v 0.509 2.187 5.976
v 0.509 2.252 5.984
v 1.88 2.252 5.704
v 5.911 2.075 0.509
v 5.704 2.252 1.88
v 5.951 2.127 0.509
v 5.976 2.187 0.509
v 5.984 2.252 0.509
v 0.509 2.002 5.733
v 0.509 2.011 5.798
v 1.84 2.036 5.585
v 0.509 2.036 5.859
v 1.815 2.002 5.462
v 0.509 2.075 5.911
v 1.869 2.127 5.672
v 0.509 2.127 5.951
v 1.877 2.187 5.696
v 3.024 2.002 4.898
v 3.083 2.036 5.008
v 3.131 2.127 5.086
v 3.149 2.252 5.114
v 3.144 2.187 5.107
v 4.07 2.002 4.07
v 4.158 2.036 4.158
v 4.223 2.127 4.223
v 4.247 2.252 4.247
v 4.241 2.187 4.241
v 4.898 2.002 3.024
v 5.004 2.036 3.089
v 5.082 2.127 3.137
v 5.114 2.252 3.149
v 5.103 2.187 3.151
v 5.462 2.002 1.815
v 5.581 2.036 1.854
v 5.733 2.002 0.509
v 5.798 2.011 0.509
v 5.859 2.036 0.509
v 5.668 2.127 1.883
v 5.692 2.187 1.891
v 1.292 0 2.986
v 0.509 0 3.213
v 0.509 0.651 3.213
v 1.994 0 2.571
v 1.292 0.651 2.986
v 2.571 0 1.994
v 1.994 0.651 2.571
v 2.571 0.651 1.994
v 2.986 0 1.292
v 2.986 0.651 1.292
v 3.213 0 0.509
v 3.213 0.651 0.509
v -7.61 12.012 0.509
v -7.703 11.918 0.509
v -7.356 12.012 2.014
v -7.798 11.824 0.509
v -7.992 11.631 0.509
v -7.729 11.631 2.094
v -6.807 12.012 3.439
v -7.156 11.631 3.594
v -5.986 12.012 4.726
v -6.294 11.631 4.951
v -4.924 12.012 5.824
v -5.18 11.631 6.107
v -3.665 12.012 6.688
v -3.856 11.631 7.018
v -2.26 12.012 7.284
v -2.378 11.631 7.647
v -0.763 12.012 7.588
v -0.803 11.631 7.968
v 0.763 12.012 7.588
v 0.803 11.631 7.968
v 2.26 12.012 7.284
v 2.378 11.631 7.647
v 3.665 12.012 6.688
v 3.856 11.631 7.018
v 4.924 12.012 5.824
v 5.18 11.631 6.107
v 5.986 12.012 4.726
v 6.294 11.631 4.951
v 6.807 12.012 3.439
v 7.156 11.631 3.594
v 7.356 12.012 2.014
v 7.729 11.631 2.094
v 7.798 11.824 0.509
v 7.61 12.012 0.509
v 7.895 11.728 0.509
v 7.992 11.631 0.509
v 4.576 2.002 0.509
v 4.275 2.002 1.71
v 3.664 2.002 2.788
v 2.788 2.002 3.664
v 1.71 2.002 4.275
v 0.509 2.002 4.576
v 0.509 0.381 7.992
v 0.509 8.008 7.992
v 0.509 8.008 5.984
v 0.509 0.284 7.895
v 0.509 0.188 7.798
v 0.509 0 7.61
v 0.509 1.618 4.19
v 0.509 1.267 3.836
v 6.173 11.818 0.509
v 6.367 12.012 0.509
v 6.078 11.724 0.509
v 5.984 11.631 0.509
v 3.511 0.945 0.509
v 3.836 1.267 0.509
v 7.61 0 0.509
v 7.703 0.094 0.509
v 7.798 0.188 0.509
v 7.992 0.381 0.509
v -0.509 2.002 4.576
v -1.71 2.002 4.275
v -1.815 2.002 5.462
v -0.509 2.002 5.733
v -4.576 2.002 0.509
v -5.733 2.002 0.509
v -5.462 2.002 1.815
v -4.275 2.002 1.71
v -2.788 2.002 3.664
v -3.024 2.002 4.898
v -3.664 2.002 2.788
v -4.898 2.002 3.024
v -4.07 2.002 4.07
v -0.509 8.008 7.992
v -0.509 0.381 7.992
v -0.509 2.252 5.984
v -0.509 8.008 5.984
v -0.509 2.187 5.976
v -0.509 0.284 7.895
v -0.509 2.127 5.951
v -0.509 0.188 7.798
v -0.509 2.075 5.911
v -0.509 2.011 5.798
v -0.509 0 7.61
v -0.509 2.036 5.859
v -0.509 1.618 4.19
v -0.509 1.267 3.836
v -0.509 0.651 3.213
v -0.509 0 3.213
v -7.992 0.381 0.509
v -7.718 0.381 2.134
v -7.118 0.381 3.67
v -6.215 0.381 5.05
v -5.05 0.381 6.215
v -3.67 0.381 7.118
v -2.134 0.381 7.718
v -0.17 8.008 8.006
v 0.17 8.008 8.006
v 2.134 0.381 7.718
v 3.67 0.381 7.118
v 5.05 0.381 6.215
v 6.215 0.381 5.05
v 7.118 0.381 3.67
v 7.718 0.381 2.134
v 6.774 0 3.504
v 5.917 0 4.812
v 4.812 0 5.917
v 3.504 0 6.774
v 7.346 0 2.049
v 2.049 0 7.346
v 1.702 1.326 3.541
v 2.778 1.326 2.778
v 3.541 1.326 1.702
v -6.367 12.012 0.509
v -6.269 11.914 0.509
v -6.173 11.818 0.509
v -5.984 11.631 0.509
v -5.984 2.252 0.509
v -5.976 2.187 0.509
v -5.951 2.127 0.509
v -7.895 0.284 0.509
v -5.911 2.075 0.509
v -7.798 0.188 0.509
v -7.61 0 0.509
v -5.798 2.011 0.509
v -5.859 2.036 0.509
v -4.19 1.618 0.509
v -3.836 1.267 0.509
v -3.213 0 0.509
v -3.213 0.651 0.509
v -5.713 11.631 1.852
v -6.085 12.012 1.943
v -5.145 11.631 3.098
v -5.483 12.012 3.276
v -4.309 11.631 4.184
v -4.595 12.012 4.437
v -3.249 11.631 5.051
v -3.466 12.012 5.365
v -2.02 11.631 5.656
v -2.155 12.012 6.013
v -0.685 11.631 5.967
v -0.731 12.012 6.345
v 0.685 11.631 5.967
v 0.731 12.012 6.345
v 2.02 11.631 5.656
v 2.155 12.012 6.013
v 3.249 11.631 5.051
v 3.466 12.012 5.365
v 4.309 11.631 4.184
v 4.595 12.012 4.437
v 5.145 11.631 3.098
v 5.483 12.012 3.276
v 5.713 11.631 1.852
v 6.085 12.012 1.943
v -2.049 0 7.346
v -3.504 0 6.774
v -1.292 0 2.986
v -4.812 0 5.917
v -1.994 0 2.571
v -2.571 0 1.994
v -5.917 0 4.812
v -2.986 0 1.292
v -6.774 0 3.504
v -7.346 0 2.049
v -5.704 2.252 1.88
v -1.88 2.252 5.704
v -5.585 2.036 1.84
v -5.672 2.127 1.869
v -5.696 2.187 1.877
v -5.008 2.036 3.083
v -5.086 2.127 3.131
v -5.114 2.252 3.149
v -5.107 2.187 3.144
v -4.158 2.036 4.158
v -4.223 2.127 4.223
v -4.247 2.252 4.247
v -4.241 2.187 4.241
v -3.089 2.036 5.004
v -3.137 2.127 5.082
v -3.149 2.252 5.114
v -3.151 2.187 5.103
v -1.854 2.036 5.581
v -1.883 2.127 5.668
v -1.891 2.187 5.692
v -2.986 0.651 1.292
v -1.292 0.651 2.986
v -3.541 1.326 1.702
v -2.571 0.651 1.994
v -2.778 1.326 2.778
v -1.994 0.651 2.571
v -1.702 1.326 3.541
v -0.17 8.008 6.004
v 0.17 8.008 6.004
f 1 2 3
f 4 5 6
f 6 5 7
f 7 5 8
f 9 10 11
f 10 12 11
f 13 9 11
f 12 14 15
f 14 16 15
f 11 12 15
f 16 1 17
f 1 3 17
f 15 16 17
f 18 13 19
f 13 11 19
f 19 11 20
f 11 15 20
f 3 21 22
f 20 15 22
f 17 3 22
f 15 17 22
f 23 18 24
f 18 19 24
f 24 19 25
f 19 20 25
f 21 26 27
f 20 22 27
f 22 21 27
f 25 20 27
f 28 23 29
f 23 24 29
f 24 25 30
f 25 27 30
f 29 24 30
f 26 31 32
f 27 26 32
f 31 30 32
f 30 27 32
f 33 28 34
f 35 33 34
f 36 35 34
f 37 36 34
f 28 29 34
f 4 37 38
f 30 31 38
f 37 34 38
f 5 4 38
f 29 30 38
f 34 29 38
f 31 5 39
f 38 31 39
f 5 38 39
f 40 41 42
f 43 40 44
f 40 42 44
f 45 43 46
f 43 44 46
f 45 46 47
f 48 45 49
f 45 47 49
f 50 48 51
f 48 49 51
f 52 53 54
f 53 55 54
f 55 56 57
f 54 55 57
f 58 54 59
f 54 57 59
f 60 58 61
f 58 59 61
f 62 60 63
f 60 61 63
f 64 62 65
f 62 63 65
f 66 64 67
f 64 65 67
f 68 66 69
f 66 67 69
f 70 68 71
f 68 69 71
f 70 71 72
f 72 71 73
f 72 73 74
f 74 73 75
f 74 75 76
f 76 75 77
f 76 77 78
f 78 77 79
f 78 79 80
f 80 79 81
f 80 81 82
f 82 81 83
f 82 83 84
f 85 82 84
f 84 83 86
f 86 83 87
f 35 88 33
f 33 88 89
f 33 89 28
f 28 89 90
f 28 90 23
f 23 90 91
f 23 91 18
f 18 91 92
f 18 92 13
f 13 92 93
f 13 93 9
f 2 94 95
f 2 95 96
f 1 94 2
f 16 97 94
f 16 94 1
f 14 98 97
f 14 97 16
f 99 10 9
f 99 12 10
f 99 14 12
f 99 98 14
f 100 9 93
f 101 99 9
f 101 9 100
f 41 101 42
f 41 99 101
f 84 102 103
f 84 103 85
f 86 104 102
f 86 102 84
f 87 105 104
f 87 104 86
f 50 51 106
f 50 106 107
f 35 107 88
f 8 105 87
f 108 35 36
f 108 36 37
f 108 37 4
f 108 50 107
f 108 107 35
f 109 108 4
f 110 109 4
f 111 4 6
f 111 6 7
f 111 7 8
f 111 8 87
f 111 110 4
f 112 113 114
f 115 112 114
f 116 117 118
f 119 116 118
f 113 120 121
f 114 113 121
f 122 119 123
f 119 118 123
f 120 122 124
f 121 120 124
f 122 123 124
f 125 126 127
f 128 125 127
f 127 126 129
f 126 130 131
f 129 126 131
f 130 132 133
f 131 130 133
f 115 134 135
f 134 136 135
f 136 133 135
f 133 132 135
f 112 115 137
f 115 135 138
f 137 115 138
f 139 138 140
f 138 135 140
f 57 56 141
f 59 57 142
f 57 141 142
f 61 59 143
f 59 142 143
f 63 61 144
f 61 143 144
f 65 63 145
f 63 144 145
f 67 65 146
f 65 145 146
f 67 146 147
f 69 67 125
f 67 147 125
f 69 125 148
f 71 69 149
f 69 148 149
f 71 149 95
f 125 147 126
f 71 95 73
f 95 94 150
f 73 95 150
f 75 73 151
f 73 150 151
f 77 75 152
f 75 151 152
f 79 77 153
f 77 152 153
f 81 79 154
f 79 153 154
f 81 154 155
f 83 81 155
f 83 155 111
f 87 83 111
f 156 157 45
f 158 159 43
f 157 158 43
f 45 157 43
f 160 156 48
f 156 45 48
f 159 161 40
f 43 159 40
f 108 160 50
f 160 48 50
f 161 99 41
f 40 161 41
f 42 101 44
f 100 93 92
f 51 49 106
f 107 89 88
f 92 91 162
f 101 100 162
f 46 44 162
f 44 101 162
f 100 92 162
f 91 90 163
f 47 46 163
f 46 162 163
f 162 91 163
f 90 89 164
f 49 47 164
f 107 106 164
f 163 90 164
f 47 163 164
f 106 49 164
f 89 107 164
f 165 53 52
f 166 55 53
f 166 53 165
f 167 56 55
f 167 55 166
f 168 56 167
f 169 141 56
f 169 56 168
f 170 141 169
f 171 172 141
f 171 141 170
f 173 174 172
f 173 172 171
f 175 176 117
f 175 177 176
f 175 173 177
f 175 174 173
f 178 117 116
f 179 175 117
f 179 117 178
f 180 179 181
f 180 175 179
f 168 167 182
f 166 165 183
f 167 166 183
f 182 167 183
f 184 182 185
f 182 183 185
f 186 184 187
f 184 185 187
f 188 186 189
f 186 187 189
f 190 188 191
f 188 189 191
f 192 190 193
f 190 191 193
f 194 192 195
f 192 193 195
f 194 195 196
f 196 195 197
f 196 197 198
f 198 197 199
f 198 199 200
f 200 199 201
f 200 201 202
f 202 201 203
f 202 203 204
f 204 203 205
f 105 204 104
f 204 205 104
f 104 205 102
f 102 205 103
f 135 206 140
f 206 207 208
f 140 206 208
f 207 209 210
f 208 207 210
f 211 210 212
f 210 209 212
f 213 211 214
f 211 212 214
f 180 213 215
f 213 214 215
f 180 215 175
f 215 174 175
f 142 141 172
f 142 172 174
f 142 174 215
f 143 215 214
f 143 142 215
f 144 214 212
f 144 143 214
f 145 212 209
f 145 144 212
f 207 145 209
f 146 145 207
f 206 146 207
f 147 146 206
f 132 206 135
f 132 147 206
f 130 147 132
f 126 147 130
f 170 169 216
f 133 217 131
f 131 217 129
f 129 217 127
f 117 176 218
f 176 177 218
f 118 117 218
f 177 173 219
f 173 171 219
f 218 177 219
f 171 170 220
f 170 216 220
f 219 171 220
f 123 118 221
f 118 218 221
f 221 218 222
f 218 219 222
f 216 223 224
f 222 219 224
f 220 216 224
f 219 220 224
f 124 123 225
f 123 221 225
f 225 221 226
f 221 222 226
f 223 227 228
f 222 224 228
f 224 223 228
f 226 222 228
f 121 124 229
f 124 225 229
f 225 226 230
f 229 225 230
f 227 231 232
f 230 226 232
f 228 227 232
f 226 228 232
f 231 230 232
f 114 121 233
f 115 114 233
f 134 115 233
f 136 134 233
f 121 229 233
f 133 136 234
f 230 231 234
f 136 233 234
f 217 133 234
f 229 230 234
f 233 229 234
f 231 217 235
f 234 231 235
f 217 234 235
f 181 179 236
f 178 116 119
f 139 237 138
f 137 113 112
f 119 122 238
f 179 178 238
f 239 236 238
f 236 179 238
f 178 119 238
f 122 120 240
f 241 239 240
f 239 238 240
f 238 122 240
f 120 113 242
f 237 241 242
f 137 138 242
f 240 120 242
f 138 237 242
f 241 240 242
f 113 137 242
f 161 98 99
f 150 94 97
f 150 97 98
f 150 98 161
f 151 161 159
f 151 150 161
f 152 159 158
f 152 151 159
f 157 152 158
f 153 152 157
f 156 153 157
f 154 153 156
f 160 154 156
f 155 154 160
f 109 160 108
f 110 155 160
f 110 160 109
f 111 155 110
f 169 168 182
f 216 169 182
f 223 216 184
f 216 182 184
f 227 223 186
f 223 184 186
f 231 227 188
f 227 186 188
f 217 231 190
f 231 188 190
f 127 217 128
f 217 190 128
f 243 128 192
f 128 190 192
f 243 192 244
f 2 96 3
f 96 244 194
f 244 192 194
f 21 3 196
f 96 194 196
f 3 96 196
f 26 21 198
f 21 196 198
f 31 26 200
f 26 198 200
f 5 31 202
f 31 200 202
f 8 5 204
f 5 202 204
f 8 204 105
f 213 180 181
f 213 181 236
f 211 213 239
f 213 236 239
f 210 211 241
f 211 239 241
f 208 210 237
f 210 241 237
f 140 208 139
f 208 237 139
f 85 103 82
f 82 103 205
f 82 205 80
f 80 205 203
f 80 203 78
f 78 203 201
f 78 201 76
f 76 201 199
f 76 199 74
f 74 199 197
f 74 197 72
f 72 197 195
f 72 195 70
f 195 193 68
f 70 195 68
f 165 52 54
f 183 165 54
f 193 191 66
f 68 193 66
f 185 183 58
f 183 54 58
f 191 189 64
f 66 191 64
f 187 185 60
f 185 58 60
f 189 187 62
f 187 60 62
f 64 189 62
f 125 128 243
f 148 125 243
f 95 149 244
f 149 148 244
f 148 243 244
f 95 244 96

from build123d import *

# Parameters (mm, degrees)
CHAMFER1_SIZE      = 1.35
FILLET1_R          = 0.25
CHAMFER2_SIZE      = 0.381
SKETCH2_W          = 16
SKETCH2_H          = 8.508
CUT_EXTRUDE1_DEPTH = 13
SKETCH3_W          = 1.016
SKETCH3_H          = 8
CUT_EXTRUDE2_DEPTH = 8
SCALE2_SCALE       = 1.001


with BuildPart() as part:
    # Sketch1 → Revolve1 (revolve)
    with BuildSketch(Plane.XY, mode=Mode.PRIVATE) as revolve1_sk:
        Polygon((3.25, 0), (3.25, 2), (6, 2), (6, 12), (8, 12), (8, 0), align=None)
    revolve(revolve1_sk.sketch.rotate(Axis((0, 0, 0), (0, 1, 0)), 90), axis=Axis((0, 0, 0), (0, 1, 0)))  # turned: the seam where the file's is

    # Chamfer1
    chamfer1_edges = [part.edges().sort_by_distance(p)[0] for p in [
        (0, 2, 3.25),
    ]]
    chamfer(chamfer1_edges, length=CHAMFER1_SIZE)

    # Fillet1
    fillet1_edges = [part.edges().sort_by_distance(p)[0] for p in [
        (0, 2, 6),
    ]]
    fillet(fillet1_edges, radius=FILLET1_R)

    # Chamfer2
    chamfer2_edges = [part.edges().sort_by_distance(p)[0] for p in [
        (0, 0, 8),
        (0, 12, 8),
        (0, 12, 6),
    ]]
    chamfer(chamfer2_edges, length=CHAMFER2_SIZE)

    # Sketch2 → Cut-Extrude1 (cut, through all)
    with BuildSketch(Plane(origin=(0, 0, 0), x_dir=(1, 0, 0), z_dir=(0, 1, 0))):
        with Locations((0, 3.746)):
            Rectangle(SKETCH2_W, SKETCH2_H)
    extrude(amount=CUT_EXTRUDE1_DEPTH, mode=Mode.SUBTRACT)

    # Sketch3 → Cut-Extrude2 (cut)
    with BuildSketch(Plane(origin=(0, 0, 0), x_dir=(1, 0, 0), z_dir=(0, 1, 0))):
        with Locations((0, -4)):
            Rectangle(SKETCH3_W, SKETCH3_H)
    extrude(amount=CUT_EXTRUDE2_DEPTH, mode=Mode.SUBTRACT)


with BuildPart() as part_1:
    # Scale2: scaled about (0, 0, 0)
    add(part.part.scale(SCALE2_SCALE))


solid = part_1.part
